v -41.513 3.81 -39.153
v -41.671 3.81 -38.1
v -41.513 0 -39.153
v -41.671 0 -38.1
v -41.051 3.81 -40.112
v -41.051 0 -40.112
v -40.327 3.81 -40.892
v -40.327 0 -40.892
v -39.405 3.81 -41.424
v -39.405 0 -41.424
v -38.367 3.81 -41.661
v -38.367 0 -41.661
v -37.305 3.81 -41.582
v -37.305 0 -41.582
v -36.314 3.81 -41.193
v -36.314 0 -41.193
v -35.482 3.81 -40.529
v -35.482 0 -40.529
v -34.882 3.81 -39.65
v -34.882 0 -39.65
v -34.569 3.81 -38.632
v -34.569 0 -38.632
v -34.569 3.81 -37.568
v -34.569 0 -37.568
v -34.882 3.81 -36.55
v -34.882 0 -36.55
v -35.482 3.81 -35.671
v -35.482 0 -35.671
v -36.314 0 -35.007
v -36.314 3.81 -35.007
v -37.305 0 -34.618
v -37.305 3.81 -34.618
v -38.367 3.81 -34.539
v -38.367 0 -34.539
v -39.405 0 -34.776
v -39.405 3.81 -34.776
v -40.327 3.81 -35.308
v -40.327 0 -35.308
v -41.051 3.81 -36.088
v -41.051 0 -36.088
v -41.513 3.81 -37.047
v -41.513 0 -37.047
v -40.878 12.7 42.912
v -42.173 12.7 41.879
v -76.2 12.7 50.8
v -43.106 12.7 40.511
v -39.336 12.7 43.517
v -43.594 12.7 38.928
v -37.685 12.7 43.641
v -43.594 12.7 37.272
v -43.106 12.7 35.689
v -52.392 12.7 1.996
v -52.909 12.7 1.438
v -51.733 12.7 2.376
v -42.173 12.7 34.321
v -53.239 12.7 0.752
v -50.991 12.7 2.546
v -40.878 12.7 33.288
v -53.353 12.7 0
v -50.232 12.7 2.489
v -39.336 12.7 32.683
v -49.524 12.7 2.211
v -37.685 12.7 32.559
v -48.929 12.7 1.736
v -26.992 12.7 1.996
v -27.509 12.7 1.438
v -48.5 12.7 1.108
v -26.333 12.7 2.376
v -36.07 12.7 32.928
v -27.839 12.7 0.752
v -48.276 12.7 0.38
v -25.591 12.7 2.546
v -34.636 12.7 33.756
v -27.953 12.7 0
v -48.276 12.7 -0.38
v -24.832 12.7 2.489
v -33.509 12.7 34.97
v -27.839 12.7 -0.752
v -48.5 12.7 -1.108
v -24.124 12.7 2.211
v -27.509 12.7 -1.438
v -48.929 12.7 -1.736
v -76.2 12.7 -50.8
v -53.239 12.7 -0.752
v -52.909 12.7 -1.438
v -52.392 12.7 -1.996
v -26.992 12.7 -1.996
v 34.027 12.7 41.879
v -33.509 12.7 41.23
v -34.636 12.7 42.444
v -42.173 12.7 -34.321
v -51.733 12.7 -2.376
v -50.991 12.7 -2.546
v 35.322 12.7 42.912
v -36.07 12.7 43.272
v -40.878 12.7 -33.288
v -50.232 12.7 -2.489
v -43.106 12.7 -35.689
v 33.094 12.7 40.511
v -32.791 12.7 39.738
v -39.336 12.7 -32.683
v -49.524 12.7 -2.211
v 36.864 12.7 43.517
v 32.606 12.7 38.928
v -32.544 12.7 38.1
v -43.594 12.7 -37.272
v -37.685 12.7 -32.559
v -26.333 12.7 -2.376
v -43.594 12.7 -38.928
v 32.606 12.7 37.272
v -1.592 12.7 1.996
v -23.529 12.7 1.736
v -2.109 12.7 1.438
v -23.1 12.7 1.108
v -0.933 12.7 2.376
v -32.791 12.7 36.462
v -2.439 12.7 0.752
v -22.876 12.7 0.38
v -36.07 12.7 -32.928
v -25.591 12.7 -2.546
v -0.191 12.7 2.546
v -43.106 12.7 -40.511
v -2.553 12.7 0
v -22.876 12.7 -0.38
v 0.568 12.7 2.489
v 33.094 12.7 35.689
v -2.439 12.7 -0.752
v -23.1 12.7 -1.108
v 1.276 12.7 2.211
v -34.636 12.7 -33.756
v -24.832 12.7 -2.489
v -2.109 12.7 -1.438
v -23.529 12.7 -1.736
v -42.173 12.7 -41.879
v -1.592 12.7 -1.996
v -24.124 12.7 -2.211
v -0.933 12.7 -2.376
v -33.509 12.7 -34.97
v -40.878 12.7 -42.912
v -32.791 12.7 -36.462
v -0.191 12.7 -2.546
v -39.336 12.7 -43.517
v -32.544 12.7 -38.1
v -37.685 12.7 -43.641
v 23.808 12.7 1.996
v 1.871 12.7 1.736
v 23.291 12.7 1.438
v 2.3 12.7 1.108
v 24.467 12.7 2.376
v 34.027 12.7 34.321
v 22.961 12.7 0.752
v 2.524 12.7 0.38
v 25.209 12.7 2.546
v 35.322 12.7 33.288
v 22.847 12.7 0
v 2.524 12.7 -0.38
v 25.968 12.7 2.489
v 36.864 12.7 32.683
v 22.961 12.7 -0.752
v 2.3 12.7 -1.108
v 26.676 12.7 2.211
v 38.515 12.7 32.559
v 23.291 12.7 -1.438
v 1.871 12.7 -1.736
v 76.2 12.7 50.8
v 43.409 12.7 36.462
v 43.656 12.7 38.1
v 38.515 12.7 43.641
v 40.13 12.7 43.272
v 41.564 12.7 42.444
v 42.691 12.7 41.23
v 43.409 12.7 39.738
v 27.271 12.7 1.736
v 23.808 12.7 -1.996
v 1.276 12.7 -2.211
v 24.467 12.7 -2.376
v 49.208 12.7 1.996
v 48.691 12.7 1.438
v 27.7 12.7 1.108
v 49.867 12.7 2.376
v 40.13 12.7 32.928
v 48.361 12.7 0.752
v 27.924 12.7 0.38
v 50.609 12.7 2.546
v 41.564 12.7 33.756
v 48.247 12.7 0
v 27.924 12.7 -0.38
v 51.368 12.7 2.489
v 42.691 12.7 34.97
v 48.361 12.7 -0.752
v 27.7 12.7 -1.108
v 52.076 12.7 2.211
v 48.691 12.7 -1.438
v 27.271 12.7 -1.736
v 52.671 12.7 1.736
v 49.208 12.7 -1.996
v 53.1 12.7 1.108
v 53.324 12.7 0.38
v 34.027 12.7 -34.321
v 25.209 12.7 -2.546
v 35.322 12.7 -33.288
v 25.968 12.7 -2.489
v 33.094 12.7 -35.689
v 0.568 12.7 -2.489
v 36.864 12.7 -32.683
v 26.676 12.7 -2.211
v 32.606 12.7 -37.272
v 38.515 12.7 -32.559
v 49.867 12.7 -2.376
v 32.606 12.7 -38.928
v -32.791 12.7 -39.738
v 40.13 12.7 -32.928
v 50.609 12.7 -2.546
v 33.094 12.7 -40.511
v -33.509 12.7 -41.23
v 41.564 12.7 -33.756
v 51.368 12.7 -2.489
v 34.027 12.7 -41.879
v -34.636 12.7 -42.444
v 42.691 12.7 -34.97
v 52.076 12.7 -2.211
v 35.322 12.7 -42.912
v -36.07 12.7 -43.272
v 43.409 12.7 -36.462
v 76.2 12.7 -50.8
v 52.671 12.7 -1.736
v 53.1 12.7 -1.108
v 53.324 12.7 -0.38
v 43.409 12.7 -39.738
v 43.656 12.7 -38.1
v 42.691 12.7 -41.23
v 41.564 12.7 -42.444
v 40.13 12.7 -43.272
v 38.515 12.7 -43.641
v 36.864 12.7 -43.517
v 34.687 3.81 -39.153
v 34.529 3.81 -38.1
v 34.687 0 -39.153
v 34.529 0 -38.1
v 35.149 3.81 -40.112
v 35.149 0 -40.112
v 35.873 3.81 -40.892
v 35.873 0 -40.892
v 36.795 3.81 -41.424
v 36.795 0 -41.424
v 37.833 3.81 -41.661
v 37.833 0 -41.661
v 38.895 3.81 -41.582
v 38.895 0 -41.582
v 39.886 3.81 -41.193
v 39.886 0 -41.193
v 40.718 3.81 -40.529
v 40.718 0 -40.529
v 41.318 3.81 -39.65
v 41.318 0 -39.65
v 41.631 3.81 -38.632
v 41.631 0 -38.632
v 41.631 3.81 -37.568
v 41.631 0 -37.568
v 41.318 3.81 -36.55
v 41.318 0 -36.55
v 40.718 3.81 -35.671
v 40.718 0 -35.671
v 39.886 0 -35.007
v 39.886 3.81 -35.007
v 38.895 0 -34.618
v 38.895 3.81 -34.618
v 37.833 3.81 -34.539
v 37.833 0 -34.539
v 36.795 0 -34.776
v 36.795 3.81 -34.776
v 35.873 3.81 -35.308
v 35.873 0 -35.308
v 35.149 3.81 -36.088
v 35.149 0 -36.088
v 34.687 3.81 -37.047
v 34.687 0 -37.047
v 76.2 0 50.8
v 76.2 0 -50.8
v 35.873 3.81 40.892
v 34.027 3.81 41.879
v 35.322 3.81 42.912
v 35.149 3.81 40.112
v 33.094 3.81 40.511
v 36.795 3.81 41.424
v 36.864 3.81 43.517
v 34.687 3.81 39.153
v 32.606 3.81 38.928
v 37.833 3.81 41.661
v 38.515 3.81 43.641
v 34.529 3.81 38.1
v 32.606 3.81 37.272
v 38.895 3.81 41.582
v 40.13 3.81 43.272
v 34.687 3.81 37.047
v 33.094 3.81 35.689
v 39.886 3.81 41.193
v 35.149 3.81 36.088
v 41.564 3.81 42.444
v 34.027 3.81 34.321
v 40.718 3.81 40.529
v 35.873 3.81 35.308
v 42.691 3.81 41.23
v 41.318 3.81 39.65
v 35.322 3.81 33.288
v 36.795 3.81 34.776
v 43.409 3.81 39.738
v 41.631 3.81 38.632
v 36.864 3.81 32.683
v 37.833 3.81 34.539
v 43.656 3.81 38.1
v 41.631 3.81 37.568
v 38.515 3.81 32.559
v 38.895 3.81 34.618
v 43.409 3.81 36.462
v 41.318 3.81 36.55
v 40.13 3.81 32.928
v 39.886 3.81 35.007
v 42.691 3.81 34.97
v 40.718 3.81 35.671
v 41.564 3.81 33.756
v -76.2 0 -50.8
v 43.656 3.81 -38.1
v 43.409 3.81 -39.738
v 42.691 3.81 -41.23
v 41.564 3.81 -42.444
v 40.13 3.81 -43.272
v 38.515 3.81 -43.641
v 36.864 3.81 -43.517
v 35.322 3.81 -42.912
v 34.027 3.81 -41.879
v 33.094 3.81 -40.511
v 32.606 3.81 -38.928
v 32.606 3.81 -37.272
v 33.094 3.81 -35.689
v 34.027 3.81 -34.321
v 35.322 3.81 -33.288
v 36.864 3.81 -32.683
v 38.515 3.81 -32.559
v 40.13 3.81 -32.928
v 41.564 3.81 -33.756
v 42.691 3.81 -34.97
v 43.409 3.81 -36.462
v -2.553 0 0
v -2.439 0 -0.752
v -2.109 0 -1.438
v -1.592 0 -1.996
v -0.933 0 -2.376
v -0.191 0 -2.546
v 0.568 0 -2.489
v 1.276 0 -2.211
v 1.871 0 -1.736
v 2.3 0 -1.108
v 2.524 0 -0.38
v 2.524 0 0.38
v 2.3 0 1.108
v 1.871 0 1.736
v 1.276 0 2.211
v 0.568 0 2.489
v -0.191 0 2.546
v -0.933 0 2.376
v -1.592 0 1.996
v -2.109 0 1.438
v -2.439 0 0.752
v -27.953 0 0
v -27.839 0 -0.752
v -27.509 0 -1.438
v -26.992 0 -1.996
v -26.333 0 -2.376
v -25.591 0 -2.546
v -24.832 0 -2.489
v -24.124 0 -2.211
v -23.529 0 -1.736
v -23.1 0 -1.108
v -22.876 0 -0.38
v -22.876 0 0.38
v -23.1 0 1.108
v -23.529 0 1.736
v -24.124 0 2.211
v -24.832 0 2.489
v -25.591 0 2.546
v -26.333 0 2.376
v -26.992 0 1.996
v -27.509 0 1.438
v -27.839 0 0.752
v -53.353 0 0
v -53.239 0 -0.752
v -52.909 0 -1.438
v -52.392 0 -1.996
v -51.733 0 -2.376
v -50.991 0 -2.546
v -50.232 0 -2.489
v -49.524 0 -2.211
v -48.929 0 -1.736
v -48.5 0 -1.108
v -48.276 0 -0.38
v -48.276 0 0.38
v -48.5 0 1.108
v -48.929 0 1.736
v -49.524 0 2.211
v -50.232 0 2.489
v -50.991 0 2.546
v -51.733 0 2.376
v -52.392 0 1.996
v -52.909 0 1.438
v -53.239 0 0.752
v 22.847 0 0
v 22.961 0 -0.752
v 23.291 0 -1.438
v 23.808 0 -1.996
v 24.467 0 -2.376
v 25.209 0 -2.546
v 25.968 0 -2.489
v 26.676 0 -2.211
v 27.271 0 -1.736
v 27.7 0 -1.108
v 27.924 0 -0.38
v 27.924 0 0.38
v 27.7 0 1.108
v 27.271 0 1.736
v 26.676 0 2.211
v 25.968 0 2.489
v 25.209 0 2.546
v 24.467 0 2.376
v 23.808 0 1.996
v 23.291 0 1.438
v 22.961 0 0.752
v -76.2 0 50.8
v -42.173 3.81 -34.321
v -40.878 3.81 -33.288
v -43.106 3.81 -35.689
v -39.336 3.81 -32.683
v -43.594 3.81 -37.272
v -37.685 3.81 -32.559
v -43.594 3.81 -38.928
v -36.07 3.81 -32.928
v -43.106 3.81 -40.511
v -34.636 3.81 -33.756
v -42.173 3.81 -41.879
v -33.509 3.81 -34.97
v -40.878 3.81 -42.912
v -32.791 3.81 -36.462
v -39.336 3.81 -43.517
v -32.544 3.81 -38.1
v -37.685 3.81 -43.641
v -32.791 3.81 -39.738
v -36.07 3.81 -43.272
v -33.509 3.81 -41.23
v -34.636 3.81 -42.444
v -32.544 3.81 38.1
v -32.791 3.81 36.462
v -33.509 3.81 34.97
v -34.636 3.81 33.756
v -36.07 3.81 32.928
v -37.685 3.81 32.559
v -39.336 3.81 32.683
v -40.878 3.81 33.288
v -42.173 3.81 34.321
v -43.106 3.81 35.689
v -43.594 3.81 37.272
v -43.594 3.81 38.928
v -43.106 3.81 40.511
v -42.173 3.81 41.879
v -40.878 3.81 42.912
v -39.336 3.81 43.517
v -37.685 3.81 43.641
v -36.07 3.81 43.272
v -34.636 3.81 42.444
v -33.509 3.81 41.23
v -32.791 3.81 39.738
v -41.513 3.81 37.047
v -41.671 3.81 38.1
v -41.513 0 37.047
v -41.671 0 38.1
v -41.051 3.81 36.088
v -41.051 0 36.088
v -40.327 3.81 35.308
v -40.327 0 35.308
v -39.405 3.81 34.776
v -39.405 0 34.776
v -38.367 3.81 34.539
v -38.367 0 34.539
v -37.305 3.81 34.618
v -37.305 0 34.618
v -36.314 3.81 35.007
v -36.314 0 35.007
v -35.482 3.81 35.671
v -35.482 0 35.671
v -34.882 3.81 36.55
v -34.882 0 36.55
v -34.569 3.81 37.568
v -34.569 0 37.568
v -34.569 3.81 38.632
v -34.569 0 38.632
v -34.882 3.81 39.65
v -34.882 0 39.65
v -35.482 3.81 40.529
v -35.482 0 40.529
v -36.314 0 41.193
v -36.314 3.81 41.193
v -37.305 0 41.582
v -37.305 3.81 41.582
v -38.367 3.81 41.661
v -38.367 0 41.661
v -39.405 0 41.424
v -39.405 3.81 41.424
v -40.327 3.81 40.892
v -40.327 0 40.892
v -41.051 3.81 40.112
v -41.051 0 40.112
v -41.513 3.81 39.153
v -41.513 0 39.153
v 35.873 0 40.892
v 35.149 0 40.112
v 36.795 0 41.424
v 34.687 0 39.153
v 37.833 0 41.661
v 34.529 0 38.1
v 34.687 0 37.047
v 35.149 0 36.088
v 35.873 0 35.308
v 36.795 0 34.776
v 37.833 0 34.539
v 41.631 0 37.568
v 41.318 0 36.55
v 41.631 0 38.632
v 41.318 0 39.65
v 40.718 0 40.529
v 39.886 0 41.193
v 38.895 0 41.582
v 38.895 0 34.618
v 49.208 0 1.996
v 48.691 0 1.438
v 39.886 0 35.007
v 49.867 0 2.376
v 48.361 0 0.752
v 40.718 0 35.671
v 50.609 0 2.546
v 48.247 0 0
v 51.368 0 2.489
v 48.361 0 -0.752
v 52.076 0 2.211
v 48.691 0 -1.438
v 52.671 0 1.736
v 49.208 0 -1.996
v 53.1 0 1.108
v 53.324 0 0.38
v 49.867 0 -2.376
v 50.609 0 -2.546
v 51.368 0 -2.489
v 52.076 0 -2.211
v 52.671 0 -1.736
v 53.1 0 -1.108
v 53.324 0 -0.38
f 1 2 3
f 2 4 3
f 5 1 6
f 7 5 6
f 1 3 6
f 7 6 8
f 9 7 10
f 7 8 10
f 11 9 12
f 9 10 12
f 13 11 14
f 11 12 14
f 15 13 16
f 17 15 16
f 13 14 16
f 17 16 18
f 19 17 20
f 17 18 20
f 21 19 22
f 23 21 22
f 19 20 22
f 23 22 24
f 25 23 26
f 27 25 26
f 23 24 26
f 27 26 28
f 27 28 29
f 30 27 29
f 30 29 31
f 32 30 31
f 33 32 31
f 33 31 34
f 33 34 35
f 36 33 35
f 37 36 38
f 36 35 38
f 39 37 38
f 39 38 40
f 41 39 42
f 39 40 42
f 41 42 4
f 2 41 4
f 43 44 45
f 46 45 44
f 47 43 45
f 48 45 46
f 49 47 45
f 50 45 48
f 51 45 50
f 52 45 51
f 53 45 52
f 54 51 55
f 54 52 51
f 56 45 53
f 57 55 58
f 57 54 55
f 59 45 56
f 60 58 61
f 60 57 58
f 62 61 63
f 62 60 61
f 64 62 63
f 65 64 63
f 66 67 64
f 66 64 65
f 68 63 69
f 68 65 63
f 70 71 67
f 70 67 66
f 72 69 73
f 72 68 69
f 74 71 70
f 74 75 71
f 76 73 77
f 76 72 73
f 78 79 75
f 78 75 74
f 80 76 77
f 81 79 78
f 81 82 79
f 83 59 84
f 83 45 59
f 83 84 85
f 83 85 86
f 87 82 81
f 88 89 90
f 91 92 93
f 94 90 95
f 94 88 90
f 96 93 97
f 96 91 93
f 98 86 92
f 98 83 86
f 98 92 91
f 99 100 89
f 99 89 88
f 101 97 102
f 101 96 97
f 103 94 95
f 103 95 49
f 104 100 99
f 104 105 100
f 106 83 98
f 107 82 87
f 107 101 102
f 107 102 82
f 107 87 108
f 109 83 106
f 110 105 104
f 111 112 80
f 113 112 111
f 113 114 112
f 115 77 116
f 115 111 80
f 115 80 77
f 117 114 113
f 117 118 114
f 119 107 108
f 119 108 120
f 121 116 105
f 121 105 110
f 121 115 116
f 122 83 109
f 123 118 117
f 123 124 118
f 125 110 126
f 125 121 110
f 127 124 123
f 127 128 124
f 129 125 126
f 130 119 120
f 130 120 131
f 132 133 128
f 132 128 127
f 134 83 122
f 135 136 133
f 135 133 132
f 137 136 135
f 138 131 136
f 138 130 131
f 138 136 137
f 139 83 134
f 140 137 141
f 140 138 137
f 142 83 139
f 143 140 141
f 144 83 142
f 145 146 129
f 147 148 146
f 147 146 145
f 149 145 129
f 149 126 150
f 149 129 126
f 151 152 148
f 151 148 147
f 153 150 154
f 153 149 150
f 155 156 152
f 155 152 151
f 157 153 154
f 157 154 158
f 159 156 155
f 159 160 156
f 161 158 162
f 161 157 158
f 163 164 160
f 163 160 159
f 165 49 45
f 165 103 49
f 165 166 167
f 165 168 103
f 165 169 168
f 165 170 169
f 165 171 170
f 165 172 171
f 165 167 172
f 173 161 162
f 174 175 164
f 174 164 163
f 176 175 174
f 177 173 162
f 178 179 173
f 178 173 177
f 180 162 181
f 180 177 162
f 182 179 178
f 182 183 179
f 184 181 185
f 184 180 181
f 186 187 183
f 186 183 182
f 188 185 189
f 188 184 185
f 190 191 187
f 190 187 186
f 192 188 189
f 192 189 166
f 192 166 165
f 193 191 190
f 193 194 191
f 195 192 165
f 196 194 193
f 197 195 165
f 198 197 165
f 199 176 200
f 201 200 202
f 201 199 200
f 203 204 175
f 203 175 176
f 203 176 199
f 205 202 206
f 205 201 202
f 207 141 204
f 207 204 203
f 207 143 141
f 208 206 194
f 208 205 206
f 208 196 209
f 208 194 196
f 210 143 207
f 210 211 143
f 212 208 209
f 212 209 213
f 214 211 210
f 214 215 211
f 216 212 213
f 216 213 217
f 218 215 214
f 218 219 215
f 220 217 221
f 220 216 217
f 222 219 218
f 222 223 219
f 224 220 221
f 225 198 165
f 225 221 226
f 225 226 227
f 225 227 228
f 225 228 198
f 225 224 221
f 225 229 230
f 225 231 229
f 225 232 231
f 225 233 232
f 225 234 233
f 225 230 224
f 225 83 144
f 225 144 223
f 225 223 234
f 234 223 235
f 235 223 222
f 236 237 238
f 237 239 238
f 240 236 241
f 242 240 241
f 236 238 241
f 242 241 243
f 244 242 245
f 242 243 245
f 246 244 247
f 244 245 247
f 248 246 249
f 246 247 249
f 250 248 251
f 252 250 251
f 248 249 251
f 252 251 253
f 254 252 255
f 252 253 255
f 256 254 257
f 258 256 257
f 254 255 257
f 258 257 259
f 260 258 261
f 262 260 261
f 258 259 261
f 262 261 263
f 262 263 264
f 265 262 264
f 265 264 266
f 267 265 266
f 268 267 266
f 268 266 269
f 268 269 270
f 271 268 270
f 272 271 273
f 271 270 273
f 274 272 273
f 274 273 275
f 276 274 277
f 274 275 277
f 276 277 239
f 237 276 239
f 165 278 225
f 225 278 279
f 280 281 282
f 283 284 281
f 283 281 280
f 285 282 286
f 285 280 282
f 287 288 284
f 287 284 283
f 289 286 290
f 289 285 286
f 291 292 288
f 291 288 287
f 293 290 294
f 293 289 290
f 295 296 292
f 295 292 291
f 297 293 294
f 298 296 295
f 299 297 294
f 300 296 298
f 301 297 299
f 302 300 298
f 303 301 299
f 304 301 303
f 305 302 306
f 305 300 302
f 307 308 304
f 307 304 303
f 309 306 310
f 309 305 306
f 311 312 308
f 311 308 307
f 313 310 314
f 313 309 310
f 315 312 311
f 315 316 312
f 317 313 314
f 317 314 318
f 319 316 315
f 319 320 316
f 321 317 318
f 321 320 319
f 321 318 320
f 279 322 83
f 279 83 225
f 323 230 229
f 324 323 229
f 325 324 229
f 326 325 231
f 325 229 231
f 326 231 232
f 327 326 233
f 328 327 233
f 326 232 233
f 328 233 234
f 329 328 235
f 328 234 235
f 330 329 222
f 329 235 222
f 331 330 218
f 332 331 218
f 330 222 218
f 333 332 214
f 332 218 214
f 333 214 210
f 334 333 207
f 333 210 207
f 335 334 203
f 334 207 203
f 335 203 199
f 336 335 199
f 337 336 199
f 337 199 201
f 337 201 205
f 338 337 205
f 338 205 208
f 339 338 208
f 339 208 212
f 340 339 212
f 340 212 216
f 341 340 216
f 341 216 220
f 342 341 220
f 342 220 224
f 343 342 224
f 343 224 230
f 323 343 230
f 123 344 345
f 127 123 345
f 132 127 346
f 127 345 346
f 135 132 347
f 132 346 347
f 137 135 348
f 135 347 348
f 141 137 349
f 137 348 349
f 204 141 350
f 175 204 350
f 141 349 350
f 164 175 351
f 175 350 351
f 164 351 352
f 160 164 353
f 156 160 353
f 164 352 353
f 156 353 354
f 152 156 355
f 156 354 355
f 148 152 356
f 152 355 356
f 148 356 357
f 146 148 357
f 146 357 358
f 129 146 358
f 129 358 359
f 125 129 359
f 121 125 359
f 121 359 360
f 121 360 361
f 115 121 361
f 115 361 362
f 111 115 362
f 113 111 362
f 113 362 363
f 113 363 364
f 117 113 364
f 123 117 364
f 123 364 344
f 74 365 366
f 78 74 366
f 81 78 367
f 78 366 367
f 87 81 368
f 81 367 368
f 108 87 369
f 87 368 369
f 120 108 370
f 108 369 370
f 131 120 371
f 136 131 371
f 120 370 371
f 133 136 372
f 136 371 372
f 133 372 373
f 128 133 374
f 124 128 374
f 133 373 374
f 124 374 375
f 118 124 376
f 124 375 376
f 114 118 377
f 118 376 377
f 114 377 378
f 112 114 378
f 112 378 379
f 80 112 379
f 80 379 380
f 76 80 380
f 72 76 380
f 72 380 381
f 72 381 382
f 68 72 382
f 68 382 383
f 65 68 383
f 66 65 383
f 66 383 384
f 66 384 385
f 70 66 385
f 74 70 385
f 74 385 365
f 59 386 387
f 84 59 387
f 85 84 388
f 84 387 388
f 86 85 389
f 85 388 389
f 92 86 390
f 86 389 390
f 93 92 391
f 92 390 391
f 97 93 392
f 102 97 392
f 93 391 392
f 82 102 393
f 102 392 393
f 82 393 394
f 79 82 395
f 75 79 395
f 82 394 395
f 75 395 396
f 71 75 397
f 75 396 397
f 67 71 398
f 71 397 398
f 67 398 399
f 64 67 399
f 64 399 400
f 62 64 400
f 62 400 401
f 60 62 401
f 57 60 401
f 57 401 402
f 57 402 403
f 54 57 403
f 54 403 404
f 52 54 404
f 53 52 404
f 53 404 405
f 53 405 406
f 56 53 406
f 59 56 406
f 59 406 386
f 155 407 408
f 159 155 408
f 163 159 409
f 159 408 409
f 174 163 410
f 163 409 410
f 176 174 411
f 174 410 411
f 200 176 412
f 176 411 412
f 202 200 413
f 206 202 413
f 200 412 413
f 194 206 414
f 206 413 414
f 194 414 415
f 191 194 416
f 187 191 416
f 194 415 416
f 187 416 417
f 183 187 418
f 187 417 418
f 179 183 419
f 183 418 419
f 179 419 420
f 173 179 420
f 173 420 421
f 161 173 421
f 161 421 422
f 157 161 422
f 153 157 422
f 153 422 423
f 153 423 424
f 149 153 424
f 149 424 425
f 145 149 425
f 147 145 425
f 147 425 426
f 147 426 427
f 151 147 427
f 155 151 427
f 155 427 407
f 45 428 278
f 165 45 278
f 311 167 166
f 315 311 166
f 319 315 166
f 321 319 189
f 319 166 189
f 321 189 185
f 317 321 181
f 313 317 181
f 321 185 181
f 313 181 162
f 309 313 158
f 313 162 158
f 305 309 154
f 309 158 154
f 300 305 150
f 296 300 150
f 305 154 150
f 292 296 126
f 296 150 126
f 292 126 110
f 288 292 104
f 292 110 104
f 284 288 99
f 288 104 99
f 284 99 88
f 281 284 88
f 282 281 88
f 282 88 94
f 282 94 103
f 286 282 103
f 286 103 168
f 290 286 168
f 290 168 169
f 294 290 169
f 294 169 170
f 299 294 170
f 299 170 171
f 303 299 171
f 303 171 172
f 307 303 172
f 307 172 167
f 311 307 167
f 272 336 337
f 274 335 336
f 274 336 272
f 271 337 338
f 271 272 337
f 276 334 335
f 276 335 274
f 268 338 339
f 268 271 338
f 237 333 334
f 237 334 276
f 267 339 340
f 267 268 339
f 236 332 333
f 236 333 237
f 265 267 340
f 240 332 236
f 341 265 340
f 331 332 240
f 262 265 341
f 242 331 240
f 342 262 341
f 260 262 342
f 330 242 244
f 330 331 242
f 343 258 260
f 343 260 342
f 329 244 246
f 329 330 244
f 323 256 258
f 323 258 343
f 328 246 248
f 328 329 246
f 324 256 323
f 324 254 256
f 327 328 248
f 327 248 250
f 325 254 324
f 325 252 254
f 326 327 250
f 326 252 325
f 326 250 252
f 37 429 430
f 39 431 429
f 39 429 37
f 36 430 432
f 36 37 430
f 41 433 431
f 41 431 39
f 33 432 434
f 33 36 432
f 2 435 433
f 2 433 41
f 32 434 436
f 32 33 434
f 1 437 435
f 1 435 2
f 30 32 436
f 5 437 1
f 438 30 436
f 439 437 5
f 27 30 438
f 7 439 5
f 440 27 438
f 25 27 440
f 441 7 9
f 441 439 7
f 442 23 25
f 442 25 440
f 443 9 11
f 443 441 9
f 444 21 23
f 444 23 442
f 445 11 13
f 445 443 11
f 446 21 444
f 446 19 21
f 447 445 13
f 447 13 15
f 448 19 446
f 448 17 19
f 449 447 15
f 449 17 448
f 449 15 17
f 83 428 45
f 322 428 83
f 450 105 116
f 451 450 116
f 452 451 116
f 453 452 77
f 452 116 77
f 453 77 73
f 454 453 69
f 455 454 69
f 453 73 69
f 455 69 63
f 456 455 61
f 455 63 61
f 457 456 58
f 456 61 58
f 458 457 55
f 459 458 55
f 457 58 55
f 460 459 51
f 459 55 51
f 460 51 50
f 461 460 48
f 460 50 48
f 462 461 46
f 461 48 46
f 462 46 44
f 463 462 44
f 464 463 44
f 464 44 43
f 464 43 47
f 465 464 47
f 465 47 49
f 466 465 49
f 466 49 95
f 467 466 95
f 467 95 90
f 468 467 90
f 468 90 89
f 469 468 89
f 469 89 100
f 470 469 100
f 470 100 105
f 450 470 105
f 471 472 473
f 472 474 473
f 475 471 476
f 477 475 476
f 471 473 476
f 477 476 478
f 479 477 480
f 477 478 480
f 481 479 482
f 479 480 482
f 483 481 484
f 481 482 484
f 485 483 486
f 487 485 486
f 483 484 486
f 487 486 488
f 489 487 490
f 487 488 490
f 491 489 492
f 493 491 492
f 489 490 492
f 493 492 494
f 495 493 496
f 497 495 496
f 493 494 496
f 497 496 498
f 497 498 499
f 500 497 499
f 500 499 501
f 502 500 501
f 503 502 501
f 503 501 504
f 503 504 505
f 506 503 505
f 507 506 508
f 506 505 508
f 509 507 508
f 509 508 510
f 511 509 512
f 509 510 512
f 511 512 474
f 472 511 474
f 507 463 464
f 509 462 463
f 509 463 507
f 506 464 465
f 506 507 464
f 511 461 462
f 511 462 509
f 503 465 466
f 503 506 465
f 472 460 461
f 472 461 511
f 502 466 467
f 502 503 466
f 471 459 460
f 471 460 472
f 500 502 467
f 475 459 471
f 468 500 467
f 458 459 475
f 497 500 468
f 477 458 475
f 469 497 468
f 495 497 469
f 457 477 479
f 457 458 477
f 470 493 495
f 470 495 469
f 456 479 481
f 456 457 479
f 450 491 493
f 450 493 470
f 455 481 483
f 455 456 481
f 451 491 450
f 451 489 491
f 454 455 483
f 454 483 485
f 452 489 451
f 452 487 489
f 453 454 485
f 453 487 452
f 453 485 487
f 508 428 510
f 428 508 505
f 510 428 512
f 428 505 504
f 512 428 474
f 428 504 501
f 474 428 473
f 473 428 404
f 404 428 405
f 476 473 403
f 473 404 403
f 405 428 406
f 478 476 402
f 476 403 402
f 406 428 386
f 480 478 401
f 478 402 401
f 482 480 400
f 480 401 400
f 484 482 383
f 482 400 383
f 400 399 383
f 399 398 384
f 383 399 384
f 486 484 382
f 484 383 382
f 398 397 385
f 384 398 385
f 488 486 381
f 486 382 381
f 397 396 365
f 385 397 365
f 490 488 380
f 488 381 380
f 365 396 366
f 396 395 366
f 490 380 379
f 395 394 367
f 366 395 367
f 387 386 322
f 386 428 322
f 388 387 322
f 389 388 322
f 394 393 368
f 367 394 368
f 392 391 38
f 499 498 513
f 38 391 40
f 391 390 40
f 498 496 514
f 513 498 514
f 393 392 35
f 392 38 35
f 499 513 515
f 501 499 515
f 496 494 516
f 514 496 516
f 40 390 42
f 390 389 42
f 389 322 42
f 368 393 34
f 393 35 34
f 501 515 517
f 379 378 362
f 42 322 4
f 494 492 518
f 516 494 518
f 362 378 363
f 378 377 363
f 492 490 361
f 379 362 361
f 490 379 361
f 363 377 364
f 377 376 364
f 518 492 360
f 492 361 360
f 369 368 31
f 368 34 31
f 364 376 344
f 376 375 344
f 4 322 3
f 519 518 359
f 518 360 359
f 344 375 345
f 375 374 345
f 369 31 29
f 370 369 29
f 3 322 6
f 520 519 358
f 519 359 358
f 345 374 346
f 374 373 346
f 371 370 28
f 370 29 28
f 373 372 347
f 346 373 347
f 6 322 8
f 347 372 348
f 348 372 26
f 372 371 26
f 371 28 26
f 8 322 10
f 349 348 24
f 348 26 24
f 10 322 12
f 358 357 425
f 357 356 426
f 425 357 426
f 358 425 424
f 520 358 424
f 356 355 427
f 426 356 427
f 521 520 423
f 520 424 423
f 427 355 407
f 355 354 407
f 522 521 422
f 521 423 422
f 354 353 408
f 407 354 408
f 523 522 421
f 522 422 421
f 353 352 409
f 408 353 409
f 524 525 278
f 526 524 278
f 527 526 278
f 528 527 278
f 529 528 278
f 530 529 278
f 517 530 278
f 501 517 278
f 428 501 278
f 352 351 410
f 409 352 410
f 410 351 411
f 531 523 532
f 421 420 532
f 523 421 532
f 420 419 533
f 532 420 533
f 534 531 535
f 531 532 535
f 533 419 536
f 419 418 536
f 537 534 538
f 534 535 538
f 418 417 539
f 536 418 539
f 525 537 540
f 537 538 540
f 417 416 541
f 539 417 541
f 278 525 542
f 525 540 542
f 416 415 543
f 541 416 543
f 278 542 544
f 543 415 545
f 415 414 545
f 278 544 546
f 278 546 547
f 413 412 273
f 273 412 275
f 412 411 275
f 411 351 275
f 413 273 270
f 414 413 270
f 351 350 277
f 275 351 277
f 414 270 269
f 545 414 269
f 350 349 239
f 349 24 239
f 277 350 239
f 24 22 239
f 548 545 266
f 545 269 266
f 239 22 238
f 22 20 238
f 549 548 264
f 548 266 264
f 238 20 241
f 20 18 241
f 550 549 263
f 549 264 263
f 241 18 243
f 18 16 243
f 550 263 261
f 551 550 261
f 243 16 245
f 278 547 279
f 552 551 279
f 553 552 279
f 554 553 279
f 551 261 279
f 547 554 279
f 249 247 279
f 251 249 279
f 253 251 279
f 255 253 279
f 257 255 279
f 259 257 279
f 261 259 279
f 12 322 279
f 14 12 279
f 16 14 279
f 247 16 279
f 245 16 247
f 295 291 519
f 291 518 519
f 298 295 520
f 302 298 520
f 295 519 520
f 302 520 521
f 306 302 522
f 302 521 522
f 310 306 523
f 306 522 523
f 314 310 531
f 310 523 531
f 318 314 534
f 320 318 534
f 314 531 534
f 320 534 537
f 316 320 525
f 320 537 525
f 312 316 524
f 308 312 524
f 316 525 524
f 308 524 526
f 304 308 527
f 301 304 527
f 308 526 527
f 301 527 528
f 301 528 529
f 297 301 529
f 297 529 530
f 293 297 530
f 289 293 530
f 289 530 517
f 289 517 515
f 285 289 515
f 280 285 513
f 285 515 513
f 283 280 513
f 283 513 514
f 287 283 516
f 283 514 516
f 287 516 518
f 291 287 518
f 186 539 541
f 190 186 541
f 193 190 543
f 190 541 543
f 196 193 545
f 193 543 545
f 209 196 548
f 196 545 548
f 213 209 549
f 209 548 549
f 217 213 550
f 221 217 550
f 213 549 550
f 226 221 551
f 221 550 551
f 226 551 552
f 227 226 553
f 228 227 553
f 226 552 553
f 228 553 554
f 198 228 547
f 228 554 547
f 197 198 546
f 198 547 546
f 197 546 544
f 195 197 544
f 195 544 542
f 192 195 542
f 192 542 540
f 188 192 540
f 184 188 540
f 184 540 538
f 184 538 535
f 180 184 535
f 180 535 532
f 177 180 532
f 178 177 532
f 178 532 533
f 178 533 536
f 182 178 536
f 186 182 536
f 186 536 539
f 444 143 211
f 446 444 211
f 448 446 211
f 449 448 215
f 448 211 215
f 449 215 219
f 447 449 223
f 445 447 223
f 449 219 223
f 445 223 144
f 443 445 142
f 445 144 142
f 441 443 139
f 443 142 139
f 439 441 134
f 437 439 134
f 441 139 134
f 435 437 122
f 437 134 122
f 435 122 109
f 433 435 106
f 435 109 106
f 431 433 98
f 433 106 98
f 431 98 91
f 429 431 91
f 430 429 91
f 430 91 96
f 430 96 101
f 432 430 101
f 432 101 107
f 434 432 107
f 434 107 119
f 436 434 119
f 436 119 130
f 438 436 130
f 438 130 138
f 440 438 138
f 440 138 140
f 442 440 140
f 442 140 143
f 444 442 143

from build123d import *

# Parameters (mm, degrees)
SKETCH1_W                                        = 152.4
SKETCH1_H                                        = 101.6
BOSS_EXTRUDE1_DEPTH                              = 12.7
CBORE_FOR_1_4_SOCKET_HEAD_CAP_SCREW1_D           = 7.14248
CBORE_FOR_1_4_SOCKET_HEAD_CAP_SCREW1_CBORE_D     = 11.1125
CBORE_FOR_1_4_SOCKET_HEAD_CAP_SCREW1_CBORE_DEPTH = 8.89
TAP_DRILL_FOR_1_4_20_TAP1_D                      = 5.1054


with BuildPart() as part:
    # Sketch1 → Boss-Extrude1 (new body)
    with BuildSketch(Plane(origin=(0, 0, 0), x_dir=(1, 0, 0), z_dir=(0, 1, 0))):
        Rectangle(SKETCH1_W, SKETCH1_H)
    extrude(amount=BOSS_EXTRUDE1_DEPTH)

    # CBORE for 1/4 Socket Head Cap Screw1 (through all)
    with Locations(Plane(origin=(0, 12.7, 0), x_dir=(1, 0, 0), z_dir=(0, 1, 0))):
        with Locations((-38.1, 38.1), (38.1, 38.1), (38.1, -38.1), (-38.1, -38.1)):
            CounterBoreHole(CBORE_FOR_1_4_SOCKET_HEAD_CAP_SCREW1_D / 2, CBORE_FOR_1_4_SOCKET_HEAD_CAP_SCREW1_CBORE_D / 2, CBORE_FOR_1_4_SOCKET_HEAD_CAP_SCREW1_CBORE_DEPTH)

    # Tap Drill for 1/4-20 Tap1 (through all)
    with Locations(Plane(origin=(0, 12.7, 0), x_dir=(1, 0, 0), z_dir=(0, 1, 0))):
        with Locations((0, 0), (25.4, 0), (50.8, 0), (-25.4, 0), (-50.8, 0)):
            Hole(TAP_DRILL_FOR_1_4_20_TAP1_D / 2)


solid = part.part
